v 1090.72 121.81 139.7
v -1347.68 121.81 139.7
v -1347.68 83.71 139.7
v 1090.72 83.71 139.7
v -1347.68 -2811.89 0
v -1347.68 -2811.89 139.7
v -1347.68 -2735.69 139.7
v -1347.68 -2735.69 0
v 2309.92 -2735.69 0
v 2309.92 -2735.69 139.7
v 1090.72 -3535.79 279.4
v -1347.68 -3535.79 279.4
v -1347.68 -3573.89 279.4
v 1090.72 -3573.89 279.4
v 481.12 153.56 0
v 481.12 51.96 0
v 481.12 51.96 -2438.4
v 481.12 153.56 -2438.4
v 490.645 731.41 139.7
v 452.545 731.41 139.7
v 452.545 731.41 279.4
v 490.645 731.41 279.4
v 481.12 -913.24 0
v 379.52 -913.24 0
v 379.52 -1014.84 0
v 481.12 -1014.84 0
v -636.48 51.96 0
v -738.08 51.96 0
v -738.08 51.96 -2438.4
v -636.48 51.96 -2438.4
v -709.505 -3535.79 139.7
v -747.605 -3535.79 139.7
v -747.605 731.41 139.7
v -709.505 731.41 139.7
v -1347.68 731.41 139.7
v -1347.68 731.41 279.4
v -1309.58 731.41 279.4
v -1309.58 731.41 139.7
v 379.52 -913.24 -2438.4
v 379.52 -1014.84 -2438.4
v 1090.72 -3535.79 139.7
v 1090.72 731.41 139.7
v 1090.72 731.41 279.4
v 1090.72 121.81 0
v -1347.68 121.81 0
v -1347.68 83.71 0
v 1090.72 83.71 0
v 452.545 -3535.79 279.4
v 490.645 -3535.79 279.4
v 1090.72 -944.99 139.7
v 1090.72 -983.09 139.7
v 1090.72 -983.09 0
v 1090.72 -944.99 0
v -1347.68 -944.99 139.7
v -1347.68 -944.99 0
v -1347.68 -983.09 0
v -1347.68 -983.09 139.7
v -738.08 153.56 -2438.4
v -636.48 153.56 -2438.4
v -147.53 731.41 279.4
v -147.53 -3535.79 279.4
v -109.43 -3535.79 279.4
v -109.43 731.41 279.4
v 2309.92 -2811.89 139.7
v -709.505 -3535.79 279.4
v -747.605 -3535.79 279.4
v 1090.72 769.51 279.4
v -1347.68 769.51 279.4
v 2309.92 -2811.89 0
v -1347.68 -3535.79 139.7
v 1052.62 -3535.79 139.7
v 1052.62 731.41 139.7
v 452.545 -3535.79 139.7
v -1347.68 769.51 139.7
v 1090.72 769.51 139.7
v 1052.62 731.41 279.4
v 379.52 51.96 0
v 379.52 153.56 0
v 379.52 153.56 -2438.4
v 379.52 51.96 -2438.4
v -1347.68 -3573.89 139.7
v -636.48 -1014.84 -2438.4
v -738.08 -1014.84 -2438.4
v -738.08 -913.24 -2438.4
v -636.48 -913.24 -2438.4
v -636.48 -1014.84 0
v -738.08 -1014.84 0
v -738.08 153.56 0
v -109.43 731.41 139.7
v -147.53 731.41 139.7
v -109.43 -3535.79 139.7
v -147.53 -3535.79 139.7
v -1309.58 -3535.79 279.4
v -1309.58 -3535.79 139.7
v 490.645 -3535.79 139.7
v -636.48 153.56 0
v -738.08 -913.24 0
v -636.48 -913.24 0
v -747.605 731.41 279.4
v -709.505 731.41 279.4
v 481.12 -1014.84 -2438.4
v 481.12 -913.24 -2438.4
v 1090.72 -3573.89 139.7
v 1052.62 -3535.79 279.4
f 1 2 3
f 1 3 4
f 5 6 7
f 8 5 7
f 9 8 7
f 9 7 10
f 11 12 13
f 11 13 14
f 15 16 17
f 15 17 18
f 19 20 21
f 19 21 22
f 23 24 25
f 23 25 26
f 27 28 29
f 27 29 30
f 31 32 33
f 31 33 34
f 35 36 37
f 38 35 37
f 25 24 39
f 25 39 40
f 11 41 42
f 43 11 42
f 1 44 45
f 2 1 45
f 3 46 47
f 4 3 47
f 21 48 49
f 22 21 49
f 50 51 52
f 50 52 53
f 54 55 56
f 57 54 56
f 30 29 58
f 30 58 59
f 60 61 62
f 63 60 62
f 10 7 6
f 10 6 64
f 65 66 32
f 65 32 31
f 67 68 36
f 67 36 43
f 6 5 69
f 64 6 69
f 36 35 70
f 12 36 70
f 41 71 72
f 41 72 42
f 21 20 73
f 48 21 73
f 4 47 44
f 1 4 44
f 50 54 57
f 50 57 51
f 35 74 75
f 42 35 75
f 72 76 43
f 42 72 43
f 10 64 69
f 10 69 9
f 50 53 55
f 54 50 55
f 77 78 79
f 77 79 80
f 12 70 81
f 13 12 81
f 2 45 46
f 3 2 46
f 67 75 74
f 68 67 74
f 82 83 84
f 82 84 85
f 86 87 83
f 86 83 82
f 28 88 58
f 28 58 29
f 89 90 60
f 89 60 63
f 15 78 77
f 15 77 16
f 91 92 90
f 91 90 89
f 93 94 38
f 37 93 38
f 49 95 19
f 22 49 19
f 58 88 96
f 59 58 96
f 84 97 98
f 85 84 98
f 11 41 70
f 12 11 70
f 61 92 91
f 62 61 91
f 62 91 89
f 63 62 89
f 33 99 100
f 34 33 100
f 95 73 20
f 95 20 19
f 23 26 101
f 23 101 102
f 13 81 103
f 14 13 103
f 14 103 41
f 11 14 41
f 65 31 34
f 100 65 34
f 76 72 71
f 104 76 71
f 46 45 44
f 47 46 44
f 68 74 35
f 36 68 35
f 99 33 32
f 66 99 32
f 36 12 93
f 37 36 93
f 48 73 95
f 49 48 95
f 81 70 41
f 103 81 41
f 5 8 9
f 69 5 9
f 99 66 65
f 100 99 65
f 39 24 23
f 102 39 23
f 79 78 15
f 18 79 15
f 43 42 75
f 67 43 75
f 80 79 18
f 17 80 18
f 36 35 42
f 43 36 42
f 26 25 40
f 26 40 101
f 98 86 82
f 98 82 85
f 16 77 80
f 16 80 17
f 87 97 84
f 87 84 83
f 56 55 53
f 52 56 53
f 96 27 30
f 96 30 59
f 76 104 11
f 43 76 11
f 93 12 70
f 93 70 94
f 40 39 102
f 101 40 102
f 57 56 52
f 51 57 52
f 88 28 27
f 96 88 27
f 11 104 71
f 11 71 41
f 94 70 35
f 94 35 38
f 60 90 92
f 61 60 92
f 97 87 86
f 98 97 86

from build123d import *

# Parameters (mm, degrees)
F0_W     = 101.6
F0_H     = 31.75
F1_DEPTH = 2438.4
F0_H_2   = 38.1
F0_W_2   = 1016
F0_W_3   = 609.6
F2_DEPTH = 139.7
F0_W_4   = 3657.6
F0_H_3   = 76.2
F4_DEPTH = 139.7
F3_W     = 38.1
F3_H     = 3619.5
F3_H_2   = 38.1
F3_H_3   = 609.6
F5_DEPTH = 139.7


with BuildPart() as f1:
    # F0 (on Top) → F1 (new body)
    with BuildSketch(Plane.XY):
        with Locations((-687.2804223888, 137.6850830514)):
            Rectangle(F0_W, F0_H)
        Polygon((-636.4804223888, 121.8100830514), (-738.0804223888, 121.8100830514), (-738.0804223888, 102.7600830514), (-738.0804223888, 83.7100830514), (-636.4804223888, 83.7100830514), align=None)
        with Locations((-687.2804223888, 67.8350830514)):
            Rectangle(F0_W, F0_H)
    extrude(amount=-F1_DEPTH)


with BuildPart() as f1b:
    # F0 (on Top) → F1, piece 2 (new body)
    with BuildSketch(Plane.XY):
        with Locations((430.3195776112, 102.7600830514)):
            Rectangle(F0_W, F0_H_2)
        with Locations((430.3195776112, 137.6850830514)):
            Rectangle(F0_W, F0_H)
        with Locations((430.3195776112, 67.8350830514)):
            Rectangle(F0_W, F0_H)
    extrude(amount=-F1_DEPTH)


with BuildPart() as f1c:
    # F0 (on Top) → F1, piece 3 (new body)
    with BuildSketch(Plane.XY):
        with Locations((430.3195776112, -929.1149169486)):
            Rectangle(F0_W, F0_H)
        with Locations((430.3195776112, -964.0399169486)):
            Rectangle(F0_W, F0_H_2)
        with Locations((430.3195776112, -998.9649169486)):
            Rectangle(F0_W, F0_H)
    extrude(amount=-F1_DEPTH)


with BuildPart() as f1d:
    # F0 (on Top) → F1, piece 4 (new body)
    with BuildSketch(Plane.XY):
        Polygon((-636.4804223888, -983.0899169486), (-636.4804223888, -944.9899169486), (-738.0804223888, -944.9899169486), (-738.0804223888, -964.0399169486), (-738.0804223888, -983.0899169486), align=None)
        with Locations((-687.2804223888, -929.1149169486)):
            Rectangle(F0_W, F0_H)
        with Locations((-687.2804223888, -998.9649169486)):
            Rectangle(F0_W, F0_H)
    extrude(amount=-F1_DEPTH)


with BuildPart() as f2:
    # F0 (on Top) → F2 (new body)
    with BuildSketch(Plane.XY):
        Polygon((-636.4804223888, 121.8100830514), (-738.0804223888, 121.8100830514), (-738.0804223888, 102.7600830514), (-738.0804223888, 83.7100830514), (-636.4804223888, 83.7100830514), align=None)
        Polygon((-738.0804223888, 102.7600830514), (-738.0804223888, 121.8100830514), (-1347.6804223888, 121.8100830514), (-1347.6804223888, 83.7100830514), (-738.0804223888, 83.7100830514), align=None)
        with Locations((-128.4804223888, 102.7600830514)):
            Rectangle(F0_W_2, F0_H_2)
        with Locations((430.3195776112, 102.7600830514)):
            Rectangle(F0_W, F0_H_2)
        with Locations((785.9195776112, 102.7600830514)):
            Rectangle(F0_W_3, F0_H_2)
    extrude(amount=F2_DEPTH)


with BuildPart() as f2b:
    # F0 (on Top) → F2, piece 2 (new body)
    with BuildSketch(Plane.XY):
        with Locations((785.9195776112, -964.0399169486)):
            Rectangle(F0_W_3, F0_H_2)
        with Locations((430.3195776112, -964.0399169486)):
            Rectangle(F0_W, F0_H_2)
        with Locations((-128.4804223888, -964.0399169486)):
            Rectangle(F0_W_2, F0_H_2)
        Polygon((-636.4804223888, -983.0899169486), (-636.4804223888, -944.9899169486), (-738.0804223888, -944.9899169486), (-738.0804223888, -964.0399169486), (-738.0804223888, -983.0899169486), align=None)
        Polygon((-738.0804223888, -964.0399169486), (-738.0804223888, -944.9899169486), (-1347.6804223888, -944.9899169486), (-1347.6804223888, -983.0899169486), (-738.0804223888, -983.0899169486), align=None)
    extrude(amount=F2_DEPTH)


with BuildPart() as f2c:
    # F0 (on Top) → F2, piece 3 (new body)
    with BuildSketch(Plane.XY):
        with Locations((481.1195776112, -2773.7899169486)):
            Rectangle(F0_W_4, F0_H_3)
    extrude(amount=F2_DEPTH)


with BuildPart() as f4:
    # F3 (on face) → F4 (new body)
    with BuildSketch(Plane.XY.offset(139.7)):
        Polygon((-1347.6804223888, 769.5100830514), (-1347.6804223888, 731.4100830514), (-1309.5804223888, 731.4100830514), (-747.6054223888, 731.4100830514), (-709.5054223888, 731.4100830514), (-147.5304223888, 731.4100830514), (-109.4304223888, 731.4100830514), (452.5445776112, 731.4100830514), (490.6445776112, 731.4100830514), (1052.6195776112, 731.4100830514), (1090.7195776112, 731.4100830514), (1090.7195776112, 769.5100830514), align=None)
    extrude(amount=F4_DEPTH)


with BuildPart() as f4b:
    # F3 (on face) → F4, piece 2 (new body)
    with BuildSketch(Plane.XY.offset(139.7)):
        Polygon((-1309.5804223888, -3535.7899169486), (-1347.6804223888, -3535.7899169486), (-1347.6804223888, -3573.8899169486), (1090.7195776112, -3573.8899169486), (1090.7195776112, -3535.7899169486), (1052.6195776112, -3535.7899169486), (490.6445776112, -3535.7899169486), (452.5445776112, -3535.7899169486), (-109.4304223888, -3535.7899169486), (-147.5304223888, -3535.7899169486), (-709.5054223888, -3535.7899169486), (-747.6054223888, -3535.7899169486), align=None)
    extrude(amount=F4_DEPTH)


with BuildPart() as f5:
    # F3 (on face) → F5 (new body)
    with BuildSketch(Plane.XY.offset(139.7)):
        with Locations((-1328.6304223888, -1726.0399169486)):
            Rectangle(F3_W, F3_H)
        with Locations((-1328.6304223888, 102.7600830514)):
            Rectangle(F3_W, F3_H_2)
        with Locations((-1328.6304223888, 426.6100830514)):
            Rectangle(F3_W, F3_H_3)
    extrude(amount=F5_DEPTH)


with BuildPart() as f5b:
    # F3 (on face) → F5, piece 2 (new body)
    with BuildSketch(Plane.XY.offset(139.7)):
        with Locations((-728.5554223888, -1726.0399169486)):
            Rectangle(F3_W, F3_H)
        with Locations((-728.5554223888, 426.6100830514)):
            Rectangle(F3_W, F3_H_3)
        with Locations((-728.5554223888, 102.7600830514)):
            Rectangle(F3_W, F3_H_2)
    extrude(amount=F5_DEPTH)


with BuildPart() as f5c:
    # F3 (on face) → F5, piece 3 (new body)
    with BuildSketch(Plane.XY.offset(139.7)):
        with Locations((-128.4804223888, -1726.0399169486)):
            Rectangle(F3_W, F3_H)
        with Locations((-128.4804223888, 102.7600830514)):
            Rectangle(F3_W, F3_H_2)
        with Locations((-128.4804223888, 426.6100830514)):
            Rectangle(F3_W, F3_H_3)
    extrude(amount=F5_DEPTH)


with BuildPart() as f5d:
    # F3 (on face) → F5, piece 4 (new body)
    with BuildSketch(Plane.XY.offset(139.7)):
        with Locations((471.5945776112, -1726.0399169486)):
            Rectangle(F3_W, F3_H)
        with Locations((471.5945776112, 426.6100830514)):
            Rectangle(F3_W, F3_H_3)
        with Locations((471.5945776112, 102.7600830514)):
            Rectangle(F3_W, F3_H_2)
    extrude(amount=F5_DEPTH)


with BuildPart() as f5e:
    # F3 (on face) → F5, piece 5 (new body)
    with BuildSketch(Plane.XY.offset(139.7)):
        with Locations((1071.6695776112, -1726.0399169486)):
            Rectangle(F3_W, F3_H)
        with Locations((1071.6695776112, 426.6100830514)):
            Rectangle(F3_W, F3_H_3)
        with Locations((1071.6695776112, 102.7600830514)):
            Rectangle(F3_W, F3_H_2)
    extrude(amount=F5_DEPTH)


solid = Compound([f1.part, f1b.part, f1c.part, f1d.part, f2.part, f2b.part, f2c.part, f4.part, f4b.part, f5.part, f5b.part, f5c.part, f5d.part, f5e.part])
